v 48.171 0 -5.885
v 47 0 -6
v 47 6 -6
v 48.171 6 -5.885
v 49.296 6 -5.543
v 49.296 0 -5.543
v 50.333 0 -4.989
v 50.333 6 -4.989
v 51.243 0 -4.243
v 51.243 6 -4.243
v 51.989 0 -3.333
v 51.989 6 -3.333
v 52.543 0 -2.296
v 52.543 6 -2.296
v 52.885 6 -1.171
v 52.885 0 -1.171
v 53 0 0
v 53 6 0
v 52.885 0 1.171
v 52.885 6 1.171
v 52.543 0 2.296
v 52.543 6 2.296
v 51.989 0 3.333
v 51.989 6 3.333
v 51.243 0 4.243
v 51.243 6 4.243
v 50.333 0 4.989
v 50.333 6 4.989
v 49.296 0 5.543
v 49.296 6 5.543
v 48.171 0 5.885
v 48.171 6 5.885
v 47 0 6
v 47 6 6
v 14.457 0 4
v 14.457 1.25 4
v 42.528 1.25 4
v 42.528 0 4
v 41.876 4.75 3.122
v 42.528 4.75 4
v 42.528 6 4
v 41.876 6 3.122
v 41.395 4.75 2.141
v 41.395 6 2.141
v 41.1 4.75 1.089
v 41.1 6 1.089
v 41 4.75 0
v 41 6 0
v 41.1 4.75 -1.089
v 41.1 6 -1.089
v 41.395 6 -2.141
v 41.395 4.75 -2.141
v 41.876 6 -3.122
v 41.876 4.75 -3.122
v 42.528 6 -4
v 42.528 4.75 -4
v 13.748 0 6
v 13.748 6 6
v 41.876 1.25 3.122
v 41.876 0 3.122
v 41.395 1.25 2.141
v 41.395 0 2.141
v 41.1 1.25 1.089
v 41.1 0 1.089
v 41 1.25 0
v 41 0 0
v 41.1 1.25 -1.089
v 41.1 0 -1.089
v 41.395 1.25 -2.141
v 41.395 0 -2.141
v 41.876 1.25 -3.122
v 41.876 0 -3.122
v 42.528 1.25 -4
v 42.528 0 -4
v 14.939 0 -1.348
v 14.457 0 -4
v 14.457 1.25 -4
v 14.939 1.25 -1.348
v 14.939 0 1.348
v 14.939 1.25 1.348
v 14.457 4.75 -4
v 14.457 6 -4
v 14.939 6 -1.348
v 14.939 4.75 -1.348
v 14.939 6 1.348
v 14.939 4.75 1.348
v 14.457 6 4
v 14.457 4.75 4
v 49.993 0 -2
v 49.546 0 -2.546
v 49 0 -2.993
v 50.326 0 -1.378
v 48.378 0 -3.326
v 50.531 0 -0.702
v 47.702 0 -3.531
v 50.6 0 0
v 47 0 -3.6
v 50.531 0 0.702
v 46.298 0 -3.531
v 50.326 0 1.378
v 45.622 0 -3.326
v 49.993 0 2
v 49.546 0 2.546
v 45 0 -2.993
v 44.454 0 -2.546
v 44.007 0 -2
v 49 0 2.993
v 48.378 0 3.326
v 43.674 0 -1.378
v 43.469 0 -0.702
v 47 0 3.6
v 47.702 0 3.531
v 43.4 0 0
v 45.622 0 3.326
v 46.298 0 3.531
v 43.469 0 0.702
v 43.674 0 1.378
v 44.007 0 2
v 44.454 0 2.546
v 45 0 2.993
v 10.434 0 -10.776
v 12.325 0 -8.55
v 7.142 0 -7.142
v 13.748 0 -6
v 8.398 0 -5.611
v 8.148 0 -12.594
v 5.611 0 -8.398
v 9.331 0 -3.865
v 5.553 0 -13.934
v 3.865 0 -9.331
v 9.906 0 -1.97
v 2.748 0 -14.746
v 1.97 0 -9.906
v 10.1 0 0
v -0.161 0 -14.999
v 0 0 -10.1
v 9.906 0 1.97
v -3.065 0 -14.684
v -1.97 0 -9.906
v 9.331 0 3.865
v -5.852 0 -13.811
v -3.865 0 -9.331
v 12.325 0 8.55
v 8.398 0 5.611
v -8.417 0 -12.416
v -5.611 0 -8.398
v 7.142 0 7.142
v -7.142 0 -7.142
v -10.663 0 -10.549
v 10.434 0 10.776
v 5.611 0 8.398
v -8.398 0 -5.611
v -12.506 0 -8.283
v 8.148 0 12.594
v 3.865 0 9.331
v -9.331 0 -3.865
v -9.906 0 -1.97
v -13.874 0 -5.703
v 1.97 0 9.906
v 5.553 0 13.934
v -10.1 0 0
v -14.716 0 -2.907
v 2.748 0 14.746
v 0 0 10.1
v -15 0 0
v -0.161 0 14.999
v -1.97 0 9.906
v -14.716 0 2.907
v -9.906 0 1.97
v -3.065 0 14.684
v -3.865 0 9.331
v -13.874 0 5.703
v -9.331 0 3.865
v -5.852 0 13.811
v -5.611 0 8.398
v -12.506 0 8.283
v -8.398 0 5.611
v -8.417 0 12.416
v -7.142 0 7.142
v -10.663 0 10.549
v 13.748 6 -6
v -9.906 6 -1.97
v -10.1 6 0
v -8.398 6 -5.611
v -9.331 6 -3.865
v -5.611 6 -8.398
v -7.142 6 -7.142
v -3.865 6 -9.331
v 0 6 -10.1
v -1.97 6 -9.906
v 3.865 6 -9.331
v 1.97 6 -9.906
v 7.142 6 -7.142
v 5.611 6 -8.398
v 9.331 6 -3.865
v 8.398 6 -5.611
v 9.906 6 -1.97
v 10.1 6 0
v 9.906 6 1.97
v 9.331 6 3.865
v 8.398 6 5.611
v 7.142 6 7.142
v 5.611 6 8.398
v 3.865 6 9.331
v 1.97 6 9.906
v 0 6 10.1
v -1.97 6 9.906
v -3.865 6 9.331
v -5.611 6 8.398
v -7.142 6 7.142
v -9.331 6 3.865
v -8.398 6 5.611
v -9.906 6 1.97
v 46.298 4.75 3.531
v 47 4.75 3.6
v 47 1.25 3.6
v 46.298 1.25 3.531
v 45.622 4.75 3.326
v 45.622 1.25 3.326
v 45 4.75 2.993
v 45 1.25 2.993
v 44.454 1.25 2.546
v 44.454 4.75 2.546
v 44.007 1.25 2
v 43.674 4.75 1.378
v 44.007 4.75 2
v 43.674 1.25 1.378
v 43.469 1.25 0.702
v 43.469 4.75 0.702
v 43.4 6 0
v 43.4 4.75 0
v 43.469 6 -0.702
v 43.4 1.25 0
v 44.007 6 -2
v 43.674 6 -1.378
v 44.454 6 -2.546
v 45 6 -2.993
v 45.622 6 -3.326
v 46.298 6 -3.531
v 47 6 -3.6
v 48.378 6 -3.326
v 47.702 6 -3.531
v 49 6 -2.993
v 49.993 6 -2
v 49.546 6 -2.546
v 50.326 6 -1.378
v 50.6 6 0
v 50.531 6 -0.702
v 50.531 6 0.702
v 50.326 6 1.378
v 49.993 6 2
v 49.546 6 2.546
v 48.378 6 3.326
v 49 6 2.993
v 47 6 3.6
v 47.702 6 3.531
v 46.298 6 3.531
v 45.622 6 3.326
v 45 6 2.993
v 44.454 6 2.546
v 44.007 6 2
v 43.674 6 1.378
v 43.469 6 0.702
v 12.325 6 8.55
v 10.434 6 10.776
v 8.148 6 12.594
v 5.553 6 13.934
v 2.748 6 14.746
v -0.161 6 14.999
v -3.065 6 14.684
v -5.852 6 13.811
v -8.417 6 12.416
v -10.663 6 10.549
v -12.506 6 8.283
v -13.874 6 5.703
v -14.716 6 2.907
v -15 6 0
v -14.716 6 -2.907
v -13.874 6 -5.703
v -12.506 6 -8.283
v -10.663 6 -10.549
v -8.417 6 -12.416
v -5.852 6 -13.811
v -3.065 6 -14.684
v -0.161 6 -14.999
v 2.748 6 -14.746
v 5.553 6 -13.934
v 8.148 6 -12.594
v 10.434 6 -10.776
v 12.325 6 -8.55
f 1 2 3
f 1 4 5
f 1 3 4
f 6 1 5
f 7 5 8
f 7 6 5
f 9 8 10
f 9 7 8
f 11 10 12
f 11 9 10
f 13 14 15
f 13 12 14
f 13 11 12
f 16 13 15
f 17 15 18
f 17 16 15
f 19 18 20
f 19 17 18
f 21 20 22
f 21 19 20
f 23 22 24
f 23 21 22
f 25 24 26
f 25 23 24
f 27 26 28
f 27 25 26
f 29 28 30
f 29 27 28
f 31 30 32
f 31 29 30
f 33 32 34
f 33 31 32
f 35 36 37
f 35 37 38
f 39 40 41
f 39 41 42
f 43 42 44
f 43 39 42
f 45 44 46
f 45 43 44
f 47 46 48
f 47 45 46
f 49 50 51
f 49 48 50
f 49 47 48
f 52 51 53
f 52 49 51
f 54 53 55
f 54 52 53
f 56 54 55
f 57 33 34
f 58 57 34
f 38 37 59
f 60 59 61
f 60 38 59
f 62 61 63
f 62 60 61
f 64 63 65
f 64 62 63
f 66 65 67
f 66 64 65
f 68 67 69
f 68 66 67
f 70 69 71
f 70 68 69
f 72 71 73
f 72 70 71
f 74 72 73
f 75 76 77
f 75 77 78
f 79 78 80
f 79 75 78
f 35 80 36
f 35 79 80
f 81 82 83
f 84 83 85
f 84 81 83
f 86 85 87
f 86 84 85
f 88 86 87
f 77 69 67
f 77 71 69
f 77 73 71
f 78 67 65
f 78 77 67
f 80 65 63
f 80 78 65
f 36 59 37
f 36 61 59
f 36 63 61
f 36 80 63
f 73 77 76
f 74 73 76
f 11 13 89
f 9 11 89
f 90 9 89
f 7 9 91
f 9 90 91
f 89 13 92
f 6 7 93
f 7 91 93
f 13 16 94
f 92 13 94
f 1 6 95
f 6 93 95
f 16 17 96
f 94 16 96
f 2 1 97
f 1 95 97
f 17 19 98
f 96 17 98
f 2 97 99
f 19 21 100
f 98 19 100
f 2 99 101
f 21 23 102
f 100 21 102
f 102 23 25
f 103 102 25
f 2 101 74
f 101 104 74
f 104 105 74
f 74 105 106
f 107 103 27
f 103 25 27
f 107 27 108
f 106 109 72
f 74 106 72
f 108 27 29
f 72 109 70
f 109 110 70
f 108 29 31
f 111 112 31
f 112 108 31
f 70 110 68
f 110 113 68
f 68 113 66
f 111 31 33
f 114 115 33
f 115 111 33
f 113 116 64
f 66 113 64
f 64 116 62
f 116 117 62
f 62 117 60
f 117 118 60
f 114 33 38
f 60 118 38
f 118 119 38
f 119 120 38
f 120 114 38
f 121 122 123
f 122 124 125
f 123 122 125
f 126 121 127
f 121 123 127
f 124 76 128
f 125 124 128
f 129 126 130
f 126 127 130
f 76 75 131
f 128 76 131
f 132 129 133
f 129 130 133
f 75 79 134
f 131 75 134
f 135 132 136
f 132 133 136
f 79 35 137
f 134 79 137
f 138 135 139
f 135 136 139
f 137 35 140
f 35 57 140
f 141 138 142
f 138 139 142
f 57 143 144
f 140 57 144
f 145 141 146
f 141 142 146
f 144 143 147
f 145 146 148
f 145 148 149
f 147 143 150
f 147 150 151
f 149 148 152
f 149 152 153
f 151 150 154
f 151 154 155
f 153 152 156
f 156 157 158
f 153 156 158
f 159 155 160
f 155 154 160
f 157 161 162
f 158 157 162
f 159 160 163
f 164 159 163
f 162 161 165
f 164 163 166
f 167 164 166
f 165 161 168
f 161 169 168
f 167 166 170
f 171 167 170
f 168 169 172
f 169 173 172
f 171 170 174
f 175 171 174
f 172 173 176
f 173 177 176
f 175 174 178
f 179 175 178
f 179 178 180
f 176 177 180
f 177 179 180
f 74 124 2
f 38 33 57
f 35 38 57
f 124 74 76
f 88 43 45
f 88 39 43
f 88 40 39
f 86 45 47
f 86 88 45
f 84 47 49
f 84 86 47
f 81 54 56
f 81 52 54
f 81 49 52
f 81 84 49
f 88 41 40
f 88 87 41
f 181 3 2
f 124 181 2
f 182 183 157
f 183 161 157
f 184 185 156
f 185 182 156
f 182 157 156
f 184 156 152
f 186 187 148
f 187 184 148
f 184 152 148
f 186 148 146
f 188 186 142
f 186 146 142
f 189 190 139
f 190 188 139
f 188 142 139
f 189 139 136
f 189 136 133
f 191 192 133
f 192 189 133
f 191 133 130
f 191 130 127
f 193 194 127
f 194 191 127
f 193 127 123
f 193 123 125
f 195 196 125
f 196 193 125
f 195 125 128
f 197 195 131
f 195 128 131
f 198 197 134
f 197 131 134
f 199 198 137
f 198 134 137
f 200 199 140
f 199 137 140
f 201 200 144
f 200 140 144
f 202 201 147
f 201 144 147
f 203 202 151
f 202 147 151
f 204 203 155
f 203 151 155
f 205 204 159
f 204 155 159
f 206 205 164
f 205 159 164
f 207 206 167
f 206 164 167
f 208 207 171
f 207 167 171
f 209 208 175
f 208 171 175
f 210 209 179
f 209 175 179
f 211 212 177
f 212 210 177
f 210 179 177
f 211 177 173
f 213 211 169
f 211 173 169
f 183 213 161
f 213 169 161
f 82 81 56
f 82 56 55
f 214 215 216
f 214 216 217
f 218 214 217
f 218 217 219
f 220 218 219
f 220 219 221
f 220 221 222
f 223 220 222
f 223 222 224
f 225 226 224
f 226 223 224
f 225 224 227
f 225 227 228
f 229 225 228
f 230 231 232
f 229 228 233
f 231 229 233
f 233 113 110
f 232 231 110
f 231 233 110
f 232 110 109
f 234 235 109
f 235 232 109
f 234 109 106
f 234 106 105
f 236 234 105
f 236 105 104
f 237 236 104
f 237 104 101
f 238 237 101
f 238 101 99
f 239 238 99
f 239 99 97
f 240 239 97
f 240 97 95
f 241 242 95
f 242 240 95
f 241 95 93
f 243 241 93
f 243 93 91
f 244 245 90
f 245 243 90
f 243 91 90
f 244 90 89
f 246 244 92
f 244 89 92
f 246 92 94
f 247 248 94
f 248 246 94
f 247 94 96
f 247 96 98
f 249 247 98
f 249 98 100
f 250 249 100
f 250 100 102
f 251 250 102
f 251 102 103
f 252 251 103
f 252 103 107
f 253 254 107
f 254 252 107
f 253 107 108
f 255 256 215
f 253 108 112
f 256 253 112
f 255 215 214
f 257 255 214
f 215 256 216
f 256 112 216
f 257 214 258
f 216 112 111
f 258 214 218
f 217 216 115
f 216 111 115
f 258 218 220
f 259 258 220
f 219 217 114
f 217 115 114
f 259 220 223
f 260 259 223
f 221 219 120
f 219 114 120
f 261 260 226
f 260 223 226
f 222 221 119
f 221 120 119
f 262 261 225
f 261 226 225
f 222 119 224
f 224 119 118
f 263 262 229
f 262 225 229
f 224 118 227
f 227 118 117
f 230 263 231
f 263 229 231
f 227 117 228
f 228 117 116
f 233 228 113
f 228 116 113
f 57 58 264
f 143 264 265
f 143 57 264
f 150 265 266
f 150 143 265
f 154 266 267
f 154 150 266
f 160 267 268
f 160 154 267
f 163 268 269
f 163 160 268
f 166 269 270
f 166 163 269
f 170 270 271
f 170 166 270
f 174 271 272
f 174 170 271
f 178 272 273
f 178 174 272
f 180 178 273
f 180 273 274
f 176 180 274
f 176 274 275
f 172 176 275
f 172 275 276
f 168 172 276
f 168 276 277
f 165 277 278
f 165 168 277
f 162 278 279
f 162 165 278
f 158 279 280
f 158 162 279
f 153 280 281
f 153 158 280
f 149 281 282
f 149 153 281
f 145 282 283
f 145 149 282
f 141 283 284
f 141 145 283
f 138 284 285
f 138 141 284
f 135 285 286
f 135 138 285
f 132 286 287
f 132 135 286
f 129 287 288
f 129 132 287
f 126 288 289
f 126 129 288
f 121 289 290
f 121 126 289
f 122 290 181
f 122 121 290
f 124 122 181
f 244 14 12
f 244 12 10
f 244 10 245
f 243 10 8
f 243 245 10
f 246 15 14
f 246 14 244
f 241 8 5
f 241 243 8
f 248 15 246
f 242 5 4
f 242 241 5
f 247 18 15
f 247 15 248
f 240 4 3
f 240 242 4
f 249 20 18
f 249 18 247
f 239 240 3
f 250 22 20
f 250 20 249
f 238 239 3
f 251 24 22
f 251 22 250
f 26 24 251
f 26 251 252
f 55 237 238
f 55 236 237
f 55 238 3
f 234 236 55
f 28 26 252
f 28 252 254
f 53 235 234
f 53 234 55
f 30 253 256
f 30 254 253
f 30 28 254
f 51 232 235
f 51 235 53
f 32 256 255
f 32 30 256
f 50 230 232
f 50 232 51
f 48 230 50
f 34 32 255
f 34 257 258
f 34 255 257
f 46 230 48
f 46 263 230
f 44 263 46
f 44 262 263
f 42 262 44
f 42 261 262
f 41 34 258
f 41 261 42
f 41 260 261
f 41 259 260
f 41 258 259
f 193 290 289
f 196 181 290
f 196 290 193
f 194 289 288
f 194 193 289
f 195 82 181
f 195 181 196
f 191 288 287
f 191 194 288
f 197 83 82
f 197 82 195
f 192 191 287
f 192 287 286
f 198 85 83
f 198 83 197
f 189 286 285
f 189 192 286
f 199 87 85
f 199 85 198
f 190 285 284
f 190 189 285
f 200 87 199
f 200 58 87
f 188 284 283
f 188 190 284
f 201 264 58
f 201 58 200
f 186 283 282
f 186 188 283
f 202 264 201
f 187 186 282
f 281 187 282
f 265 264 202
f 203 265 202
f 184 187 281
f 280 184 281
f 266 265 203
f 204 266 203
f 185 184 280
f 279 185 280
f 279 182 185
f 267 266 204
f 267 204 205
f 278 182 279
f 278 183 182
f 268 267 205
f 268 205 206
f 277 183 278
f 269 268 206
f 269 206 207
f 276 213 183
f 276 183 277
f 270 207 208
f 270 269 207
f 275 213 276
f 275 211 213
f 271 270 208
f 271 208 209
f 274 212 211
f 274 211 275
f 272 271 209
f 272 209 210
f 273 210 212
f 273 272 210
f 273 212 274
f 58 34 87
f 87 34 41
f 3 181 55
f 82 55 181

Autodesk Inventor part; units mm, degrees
ref_plane "XZ Plane" through (0, 0, 0) normal (0, 1, 0) x (-1, 0, 0)
ref_plane "XY Plane" through (0, 0, 0) normal (0, 0, 1) x (1, 0, 0)
sketch "草图1" plane through (0, 0, 0) normal (0, 1, 0) x (-1, 0, 0)
  circle A0 centre (0, 0) radius 10.1
  circle A1 centre (0, 0) radius 15
  dimension "d0" = 20.2
  dimension "d1" = 30
extrude "拉伸1" add sketch "草图1" along normal blind 6
ref_plane "工作平面1" through (12, 0, 0) normal (1, 0, 0) x (0, 1, 0)
sketch "草图2" plane through (12, 0, 0) normal (1, 0, 0) x (0, 1, 0)
  line L0 (6, -15) -> (6, 15) construction
  line L1 (6, -6) -> (0, -6)
  line L2 (0, -6) -> (0, 6) construction
  line L3 (0, -15) -> (0, 15) construction
  line L4 (6, 6) -> (6, -6) construction
  line L5 (0, 6) -> (6, 6)
  line L6 (6, 0) -> (0, 0)
  line L7 (6, 6) -> (6, 4)
  line L8 (6, 4) -> (4.75, 4)
  line L9 (4.75, 4) -> (4.75, -4)
  line L10 (4.75, -4) -> (6, -4)
  line L11 (6, -4) -> (6, -6)
  line L12 (0, -6) -> (0, -4)
  line L13 (1.25, -4) -> (0, -4)
  line L14 (1.25, -4) -> (1.25, 4)
  line L15 (1.25, 4) -> (0, 4)
  line L16 (0, 6) -> (0, 4)
  line L17 (3, 6) -> (3, -6)
  dimension "d5" = 12
  dimension "d6" = 2
  dimension "d7" = 3.5
extrude "拉伸2" add sketch "草图2" along normal blind 35
sketch "草图3" plane through (0, 0, 0) normal (0, 1, 0) x (-1, 0, 0)
  line L0 (-47, 4) -> (-47, -4) projected
  circle A0 centre (-47, 0) radius 6
  circle A1 centre (-47, 0) radius 3.6
  point P0 (0, 0)
  point P1 (-47, -6)
  dimension "d10" = 7.2
extrude "拉伸3" cut sketch "草图3" along normal mid plane 35 contours A1 L0 | L0 A1
extrude "拉伸4" add sketch "草图3" along normal blind 6
properties part number "偏心轮外连接件"
